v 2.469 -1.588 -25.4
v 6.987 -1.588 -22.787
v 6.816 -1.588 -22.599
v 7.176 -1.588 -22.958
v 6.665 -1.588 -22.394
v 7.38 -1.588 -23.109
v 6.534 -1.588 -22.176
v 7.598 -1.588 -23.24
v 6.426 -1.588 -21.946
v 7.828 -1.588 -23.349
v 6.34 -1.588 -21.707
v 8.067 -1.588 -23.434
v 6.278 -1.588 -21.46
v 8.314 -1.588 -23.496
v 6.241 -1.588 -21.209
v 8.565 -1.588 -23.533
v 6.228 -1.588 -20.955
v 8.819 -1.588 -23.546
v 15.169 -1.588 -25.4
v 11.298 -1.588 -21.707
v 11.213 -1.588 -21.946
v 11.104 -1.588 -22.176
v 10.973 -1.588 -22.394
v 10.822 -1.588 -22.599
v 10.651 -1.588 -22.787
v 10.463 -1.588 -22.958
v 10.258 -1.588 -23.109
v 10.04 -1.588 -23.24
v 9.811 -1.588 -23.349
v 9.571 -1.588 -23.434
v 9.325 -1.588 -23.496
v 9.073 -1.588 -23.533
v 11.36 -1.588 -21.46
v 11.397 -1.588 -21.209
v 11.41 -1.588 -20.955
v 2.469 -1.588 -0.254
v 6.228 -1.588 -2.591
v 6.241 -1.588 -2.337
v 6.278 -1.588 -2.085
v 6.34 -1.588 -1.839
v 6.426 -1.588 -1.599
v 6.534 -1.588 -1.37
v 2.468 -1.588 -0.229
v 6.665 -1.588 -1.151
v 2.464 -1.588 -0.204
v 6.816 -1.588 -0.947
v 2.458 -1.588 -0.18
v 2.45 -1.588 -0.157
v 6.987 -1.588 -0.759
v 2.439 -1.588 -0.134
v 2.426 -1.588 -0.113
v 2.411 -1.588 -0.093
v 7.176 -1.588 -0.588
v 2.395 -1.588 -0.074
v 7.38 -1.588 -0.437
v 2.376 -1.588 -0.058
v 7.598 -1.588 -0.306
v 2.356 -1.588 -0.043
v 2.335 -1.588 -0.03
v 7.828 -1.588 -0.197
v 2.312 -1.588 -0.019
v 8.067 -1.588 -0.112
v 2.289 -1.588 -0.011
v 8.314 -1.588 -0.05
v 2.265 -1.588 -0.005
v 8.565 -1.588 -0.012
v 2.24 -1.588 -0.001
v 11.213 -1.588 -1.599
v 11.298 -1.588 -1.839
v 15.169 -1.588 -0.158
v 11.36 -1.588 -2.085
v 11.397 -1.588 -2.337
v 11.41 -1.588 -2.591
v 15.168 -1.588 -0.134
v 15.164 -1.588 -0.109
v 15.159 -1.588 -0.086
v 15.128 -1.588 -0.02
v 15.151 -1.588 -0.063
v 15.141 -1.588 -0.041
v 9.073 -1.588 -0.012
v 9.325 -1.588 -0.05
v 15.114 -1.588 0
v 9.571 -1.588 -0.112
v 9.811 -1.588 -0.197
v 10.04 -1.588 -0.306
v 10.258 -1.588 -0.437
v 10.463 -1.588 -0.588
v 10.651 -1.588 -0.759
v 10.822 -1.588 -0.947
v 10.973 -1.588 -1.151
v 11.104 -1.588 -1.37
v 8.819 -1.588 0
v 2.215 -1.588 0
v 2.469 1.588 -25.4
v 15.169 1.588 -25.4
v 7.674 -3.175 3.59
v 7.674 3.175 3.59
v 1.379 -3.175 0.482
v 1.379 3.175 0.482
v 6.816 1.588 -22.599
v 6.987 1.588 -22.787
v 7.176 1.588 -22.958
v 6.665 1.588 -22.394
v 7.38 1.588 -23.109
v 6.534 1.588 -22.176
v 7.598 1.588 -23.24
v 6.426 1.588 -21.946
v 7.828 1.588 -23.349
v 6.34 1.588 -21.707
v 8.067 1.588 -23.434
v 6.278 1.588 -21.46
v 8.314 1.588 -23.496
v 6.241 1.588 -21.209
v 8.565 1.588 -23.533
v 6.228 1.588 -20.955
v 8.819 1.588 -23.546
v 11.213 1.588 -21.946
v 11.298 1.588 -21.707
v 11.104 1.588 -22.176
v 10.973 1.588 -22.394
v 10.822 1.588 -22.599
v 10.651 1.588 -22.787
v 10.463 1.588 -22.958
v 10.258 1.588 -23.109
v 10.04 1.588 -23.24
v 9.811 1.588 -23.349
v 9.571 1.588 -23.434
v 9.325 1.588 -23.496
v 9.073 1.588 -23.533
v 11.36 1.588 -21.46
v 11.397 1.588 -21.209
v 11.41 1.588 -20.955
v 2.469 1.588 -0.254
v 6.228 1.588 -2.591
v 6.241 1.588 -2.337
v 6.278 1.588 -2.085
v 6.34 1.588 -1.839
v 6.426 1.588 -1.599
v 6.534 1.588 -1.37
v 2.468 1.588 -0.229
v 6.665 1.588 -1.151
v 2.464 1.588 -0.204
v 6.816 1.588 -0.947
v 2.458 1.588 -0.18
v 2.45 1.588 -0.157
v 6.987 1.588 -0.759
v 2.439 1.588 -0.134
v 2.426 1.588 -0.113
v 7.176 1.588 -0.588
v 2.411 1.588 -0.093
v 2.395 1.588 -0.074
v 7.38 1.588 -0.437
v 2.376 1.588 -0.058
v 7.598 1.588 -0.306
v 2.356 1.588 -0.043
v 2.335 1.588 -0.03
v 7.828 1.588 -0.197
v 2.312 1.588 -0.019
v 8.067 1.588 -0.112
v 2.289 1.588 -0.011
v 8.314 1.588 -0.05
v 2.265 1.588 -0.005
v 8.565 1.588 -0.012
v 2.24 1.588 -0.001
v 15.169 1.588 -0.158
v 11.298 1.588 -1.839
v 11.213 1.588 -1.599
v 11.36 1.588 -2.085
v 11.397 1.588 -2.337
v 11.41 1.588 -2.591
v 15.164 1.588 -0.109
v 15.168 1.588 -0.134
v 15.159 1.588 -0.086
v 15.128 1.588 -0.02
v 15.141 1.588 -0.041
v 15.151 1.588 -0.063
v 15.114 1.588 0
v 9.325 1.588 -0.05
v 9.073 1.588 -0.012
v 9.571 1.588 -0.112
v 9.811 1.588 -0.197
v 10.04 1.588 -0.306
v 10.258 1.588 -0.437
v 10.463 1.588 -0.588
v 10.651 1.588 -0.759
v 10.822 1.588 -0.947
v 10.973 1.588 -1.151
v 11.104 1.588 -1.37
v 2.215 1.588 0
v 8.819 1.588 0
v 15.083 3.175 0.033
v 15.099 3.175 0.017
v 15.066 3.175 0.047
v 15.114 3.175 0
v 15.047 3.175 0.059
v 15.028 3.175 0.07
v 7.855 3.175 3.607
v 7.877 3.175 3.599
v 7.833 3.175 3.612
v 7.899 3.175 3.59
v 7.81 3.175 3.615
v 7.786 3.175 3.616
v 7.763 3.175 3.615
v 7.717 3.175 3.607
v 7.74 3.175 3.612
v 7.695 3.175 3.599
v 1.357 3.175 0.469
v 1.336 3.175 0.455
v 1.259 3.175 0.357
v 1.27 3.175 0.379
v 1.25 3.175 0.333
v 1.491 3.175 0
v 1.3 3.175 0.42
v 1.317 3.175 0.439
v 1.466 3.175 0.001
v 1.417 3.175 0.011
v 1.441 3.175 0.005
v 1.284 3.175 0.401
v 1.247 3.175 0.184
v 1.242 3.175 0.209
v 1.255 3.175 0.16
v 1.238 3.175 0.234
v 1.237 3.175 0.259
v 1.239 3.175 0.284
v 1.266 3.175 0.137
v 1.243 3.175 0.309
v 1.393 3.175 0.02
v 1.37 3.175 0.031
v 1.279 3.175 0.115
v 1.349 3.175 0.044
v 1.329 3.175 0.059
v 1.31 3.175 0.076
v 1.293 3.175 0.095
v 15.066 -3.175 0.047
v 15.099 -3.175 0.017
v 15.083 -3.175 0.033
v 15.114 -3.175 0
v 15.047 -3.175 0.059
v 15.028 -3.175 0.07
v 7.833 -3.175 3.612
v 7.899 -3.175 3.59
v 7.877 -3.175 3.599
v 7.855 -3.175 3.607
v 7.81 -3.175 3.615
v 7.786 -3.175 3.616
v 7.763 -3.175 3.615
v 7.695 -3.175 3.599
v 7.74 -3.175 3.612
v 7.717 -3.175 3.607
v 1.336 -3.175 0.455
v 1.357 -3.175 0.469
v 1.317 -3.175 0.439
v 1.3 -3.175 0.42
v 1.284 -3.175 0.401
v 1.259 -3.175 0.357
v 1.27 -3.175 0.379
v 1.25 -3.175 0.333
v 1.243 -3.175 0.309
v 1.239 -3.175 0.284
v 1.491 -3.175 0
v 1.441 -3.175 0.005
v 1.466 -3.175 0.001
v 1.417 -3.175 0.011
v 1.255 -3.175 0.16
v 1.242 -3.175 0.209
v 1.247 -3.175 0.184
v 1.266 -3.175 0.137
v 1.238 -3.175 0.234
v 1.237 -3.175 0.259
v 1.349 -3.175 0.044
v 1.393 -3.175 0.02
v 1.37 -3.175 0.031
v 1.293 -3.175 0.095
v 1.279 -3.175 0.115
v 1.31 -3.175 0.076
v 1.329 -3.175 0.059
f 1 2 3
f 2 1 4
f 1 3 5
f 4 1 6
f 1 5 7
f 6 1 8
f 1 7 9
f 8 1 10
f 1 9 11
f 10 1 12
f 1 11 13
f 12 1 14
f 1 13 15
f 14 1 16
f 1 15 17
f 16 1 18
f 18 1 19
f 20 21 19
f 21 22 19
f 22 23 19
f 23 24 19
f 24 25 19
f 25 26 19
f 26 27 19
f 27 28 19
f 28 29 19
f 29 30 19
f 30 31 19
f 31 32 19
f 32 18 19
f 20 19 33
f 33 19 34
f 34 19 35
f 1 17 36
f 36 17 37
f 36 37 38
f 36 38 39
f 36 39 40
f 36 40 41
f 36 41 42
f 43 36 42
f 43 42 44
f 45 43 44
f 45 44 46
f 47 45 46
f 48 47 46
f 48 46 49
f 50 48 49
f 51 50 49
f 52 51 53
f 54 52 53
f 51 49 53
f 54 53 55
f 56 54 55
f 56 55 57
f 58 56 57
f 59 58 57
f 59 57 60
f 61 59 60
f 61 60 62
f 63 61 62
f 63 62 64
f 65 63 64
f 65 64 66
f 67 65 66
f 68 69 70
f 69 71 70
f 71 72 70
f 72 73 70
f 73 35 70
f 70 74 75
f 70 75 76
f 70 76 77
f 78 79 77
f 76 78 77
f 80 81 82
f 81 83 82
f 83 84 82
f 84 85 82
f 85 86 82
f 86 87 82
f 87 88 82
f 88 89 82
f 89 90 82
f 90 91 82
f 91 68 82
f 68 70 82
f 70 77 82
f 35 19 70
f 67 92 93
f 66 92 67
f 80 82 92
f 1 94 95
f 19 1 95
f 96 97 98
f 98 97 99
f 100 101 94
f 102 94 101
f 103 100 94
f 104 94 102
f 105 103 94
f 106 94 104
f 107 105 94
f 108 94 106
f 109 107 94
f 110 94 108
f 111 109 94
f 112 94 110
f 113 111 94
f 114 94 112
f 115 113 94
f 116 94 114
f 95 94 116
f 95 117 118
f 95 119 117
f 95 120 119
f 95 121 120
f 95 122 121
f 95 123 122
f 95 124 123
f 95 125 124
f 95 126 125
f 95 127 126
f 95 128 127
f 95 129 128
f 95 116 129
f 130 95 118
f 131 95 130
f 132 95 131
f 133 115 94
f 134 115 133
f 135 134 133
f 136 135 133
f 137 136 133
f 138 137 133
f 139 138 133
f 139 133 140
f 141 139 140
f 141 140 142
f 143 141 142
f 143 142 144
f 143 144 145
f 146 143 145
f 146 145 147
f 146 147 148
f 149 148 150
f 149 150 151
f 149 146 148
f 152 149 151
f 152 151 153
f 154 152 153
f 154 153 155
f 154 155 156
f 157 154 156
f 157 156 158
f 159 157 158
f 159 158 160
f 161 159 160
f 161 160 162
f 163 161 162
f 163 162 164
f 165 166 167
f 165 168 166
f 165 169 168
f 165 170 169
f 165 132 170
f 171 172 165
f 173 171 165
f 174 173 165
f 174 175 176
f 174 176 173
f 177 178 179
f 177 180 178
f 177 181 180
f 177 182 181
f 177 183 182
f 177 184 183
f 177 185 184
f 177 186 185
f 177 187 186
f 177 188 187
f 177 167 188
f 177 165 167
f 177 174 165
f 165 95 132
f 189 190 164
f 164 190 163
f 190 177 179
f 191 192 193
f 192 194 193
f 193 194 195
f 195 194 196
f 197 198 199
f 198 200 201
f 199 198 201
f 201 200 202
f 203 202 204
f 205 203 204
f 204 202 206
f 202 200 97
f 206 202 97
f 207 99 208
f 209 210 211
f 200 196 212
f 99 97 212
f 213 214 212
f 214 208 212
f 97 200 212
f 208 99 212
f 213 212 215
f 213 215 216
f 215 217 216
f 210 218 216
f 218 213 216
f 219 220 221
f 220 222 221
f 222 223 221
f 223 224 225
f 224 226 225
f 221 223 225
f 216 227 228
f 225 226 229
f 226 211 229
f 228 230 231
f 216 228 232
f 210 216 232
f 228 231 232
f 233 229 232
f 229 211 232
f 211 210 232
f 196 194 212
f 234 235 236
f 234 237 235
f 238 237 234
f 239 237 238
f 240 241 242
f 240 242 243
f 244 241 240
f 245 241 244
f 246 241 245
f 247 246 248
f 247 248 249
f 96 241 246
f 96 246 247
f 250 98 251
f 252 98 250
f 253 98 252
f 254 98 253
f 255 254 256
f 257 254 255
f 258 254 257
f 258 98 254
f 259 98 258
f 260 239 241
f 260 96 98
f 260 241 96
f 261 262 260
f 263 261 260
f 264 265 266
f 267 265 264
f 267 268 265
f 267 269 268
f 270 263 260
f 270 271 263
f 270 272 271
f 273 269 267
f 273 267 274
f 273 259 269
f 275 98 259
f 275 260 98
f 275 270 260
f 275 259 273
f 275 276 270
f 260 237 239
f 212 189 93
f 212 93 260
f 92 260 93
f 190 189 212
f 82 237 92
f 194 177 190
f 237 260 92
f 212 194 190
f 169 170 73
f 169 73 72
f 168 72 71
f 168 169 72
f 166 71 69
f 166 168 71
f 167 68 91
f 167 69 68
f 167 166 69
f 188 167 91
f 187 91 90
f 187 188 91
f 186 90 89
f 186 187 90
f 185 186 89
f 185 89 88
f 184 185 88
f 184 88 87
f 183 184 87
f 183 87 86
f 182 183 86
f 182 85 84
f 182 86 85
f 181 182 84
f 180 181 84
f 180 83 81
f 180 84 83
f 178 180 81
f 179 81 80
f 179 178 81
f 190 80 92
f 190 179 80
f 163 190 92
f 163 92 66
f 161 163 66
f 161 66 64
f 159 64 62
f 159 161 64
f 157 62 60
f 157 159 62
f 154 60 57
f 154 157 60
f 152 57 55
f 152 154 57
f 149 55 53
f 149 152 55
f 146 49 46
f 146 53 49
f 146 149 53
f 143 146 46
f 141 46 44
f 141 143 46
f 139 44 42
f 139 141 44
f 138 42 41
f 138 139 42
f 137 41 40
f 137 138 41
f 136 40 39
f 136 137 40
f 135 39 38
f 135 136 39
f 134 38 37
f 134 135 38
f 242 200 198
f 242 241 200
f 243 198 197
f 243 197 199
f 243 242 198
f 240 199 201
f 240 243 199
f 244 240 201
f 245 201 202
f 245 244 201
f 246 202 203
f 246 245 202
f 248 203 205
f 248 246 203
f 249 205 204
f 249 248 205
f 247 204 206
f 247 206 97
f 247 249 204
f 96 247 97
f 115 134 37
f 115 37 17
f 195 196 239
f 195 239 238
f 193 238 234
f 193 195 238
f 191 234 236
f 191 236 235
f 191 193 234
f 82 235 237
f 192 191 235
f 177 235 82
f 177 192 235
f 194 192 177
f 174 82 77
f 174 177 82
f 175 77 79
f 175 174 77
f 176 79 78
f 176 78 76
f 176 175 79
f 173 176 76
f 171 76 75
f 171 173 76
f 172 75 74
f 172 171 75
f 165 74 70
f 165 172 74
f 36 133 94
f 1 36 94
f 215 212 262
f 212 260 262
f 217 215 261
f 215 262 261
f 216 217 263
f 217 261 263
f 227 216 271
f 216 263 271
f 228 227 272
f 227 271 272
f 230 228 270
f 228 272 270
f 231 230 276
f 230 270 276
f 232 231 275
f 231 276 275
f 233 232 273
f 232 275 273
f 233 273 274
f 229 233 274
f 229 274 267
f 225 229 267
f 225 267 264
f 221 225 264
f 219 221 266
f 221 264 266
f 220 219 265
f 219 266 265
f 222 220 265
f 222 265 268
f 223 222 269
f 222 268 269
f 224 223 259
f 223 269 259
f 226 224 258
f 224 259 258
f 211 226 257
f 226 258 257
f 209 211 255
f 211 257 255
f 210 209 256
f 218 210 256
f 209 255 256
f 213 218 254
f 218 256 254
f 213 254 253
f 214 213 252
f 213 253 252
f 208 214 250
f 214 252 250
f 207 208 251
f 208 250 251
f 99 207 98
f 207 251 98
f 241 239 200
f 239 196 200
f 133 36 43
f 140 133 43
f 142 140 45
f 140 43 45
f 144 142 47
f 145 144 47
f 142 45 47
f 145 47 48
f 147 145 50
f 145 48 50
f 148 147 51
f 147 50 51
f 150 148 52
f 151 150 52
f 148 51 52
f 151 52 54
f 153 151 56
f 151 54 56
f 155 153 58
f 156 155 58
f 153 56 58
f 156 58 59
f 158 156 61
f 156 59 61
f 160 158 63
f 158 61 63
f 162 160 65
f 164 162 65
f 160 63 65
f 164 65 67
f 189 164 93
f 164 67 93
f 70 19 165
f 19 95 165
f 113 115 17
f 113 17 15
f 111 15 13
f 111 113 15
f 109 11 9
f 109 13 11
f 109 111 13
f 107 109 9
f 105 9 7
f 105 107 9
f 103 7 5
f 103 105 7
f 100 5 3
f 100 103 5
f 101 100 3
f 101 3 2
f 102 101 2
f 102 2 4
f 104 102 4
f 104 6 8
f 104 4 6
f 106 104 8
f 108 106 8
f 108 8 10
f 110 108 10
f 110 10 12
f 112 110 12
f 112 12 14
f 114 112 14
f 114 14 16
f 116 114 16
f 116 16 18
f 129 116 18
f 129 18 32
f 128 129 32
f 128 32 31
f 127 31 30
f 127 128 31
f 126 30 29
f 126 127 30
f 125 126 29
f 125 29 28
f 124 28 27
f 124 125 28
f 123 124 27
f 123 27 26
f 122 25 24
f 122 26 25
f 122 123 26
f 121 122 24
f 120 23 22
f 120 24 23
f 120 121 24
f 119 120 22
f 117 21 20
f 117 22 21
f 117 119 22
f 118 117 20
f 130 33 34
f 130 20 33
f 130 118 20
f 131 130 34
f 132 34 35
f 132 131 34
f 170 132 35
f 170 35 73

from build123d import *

# Parameters (mm, degrees)
BOSS_EXTRUDE1_DEPTH     = 3.175
FILLET1_R               = 0.254
CUT_EXTRUDE1_REACH      = 32.259
CUT_EXTRUDE2_DEPTH      = 29.575
CUT_EXTRUDE2_DEPTH_BACK = 29.575
SKETCH6_W               = 25.4
SKETCH6_H               = 1.5875


with BuildPart() as part:
    # Sketch1 → Boss-Extrude1 (new, symmetric)
    with BuildSketch(Plane(origin=(0, 0, 0), x_dir=(1, 0, 0), z_dir=(0, 1, 0))):
        Polygon((15.169114158, 0), (7.786246133, -3.645659373), (0.403378108, 0), (2.469114158, 0), (2.469114158, 25.4), (15.169114158, 25.4), align=None)
    extrude(amount=BOSS_EXTRUDE1_DEPTH, both=True)

    # Fillet1
    fillet1_edges = [part.edges().sort_by_distance(p)[0] for p in [
        (2.469114158, 0, 0),
        (15.169114158, 0, 0),
        (7.786246133, 0, 3.645659373),
        (0.403378108, 0, 0),
    ]]
    fillet(fillet1_edges, radius=FILLET1_R)

    # Sketch5 → Cut-Extrude1 (cut, up to next)
    with BuildSketch(Plane(origin=(0, 3.175, 0), x_dir=(1, 0, 0), z_dir=(0, 1, 0)), mode=Mode.PRIVATE) as cut_extrude1_sk1:
        with BuildLine():
            Line((11.409914158, 20.955), (11.409914158, 2.5908))
            ThreePointArc((11.409914158, 2.5908), (8.819114158, 0), (6.228314158, 2.5908))
            Line((6.228314158, 2.5908), (6.228314158, 20.955))
            ThreePointArc((6.228314158, 20.955), (8.819114158, 23.5458), (11.409914158, 20.955))
        make_face()
    cut_extrude1_tool1 = extrude(cut_extrude1_sk1.sketch, amount=-CUT_EXTRUDE1_REACH, mode=Mode.PRIVATE) & part.part
    add(cut_extrude1_tool1.solids().sort_by_distance((8.819114, 3.175, -11.7729))[0], mode=Mode.SUBTRACT)

    # Sketch6 → Cut-Extrude2 (cut, two sides: drawn at the far end of the back side and taken through both)
    with BuildSketch(Plane.ZY.offset(-2.469114158).offset(-CUT_EXTRUDE2_DEPTH_BACK)):
        with Locations((-12.7, 2.38125)):
            Rectangle(SKETCH6_W, SKETCH6_H)
        with Locations((-12.7, -2.38125)):
            Rectangle(SKETCH6_W, SKETCH6_H)
    extrude(amount=CUT_EXTRUDE2_DEPTH + CUT_EXTRUDE2_DEPTH_BACK, mode=Mode.SUBTRACT)


solid = part.part
